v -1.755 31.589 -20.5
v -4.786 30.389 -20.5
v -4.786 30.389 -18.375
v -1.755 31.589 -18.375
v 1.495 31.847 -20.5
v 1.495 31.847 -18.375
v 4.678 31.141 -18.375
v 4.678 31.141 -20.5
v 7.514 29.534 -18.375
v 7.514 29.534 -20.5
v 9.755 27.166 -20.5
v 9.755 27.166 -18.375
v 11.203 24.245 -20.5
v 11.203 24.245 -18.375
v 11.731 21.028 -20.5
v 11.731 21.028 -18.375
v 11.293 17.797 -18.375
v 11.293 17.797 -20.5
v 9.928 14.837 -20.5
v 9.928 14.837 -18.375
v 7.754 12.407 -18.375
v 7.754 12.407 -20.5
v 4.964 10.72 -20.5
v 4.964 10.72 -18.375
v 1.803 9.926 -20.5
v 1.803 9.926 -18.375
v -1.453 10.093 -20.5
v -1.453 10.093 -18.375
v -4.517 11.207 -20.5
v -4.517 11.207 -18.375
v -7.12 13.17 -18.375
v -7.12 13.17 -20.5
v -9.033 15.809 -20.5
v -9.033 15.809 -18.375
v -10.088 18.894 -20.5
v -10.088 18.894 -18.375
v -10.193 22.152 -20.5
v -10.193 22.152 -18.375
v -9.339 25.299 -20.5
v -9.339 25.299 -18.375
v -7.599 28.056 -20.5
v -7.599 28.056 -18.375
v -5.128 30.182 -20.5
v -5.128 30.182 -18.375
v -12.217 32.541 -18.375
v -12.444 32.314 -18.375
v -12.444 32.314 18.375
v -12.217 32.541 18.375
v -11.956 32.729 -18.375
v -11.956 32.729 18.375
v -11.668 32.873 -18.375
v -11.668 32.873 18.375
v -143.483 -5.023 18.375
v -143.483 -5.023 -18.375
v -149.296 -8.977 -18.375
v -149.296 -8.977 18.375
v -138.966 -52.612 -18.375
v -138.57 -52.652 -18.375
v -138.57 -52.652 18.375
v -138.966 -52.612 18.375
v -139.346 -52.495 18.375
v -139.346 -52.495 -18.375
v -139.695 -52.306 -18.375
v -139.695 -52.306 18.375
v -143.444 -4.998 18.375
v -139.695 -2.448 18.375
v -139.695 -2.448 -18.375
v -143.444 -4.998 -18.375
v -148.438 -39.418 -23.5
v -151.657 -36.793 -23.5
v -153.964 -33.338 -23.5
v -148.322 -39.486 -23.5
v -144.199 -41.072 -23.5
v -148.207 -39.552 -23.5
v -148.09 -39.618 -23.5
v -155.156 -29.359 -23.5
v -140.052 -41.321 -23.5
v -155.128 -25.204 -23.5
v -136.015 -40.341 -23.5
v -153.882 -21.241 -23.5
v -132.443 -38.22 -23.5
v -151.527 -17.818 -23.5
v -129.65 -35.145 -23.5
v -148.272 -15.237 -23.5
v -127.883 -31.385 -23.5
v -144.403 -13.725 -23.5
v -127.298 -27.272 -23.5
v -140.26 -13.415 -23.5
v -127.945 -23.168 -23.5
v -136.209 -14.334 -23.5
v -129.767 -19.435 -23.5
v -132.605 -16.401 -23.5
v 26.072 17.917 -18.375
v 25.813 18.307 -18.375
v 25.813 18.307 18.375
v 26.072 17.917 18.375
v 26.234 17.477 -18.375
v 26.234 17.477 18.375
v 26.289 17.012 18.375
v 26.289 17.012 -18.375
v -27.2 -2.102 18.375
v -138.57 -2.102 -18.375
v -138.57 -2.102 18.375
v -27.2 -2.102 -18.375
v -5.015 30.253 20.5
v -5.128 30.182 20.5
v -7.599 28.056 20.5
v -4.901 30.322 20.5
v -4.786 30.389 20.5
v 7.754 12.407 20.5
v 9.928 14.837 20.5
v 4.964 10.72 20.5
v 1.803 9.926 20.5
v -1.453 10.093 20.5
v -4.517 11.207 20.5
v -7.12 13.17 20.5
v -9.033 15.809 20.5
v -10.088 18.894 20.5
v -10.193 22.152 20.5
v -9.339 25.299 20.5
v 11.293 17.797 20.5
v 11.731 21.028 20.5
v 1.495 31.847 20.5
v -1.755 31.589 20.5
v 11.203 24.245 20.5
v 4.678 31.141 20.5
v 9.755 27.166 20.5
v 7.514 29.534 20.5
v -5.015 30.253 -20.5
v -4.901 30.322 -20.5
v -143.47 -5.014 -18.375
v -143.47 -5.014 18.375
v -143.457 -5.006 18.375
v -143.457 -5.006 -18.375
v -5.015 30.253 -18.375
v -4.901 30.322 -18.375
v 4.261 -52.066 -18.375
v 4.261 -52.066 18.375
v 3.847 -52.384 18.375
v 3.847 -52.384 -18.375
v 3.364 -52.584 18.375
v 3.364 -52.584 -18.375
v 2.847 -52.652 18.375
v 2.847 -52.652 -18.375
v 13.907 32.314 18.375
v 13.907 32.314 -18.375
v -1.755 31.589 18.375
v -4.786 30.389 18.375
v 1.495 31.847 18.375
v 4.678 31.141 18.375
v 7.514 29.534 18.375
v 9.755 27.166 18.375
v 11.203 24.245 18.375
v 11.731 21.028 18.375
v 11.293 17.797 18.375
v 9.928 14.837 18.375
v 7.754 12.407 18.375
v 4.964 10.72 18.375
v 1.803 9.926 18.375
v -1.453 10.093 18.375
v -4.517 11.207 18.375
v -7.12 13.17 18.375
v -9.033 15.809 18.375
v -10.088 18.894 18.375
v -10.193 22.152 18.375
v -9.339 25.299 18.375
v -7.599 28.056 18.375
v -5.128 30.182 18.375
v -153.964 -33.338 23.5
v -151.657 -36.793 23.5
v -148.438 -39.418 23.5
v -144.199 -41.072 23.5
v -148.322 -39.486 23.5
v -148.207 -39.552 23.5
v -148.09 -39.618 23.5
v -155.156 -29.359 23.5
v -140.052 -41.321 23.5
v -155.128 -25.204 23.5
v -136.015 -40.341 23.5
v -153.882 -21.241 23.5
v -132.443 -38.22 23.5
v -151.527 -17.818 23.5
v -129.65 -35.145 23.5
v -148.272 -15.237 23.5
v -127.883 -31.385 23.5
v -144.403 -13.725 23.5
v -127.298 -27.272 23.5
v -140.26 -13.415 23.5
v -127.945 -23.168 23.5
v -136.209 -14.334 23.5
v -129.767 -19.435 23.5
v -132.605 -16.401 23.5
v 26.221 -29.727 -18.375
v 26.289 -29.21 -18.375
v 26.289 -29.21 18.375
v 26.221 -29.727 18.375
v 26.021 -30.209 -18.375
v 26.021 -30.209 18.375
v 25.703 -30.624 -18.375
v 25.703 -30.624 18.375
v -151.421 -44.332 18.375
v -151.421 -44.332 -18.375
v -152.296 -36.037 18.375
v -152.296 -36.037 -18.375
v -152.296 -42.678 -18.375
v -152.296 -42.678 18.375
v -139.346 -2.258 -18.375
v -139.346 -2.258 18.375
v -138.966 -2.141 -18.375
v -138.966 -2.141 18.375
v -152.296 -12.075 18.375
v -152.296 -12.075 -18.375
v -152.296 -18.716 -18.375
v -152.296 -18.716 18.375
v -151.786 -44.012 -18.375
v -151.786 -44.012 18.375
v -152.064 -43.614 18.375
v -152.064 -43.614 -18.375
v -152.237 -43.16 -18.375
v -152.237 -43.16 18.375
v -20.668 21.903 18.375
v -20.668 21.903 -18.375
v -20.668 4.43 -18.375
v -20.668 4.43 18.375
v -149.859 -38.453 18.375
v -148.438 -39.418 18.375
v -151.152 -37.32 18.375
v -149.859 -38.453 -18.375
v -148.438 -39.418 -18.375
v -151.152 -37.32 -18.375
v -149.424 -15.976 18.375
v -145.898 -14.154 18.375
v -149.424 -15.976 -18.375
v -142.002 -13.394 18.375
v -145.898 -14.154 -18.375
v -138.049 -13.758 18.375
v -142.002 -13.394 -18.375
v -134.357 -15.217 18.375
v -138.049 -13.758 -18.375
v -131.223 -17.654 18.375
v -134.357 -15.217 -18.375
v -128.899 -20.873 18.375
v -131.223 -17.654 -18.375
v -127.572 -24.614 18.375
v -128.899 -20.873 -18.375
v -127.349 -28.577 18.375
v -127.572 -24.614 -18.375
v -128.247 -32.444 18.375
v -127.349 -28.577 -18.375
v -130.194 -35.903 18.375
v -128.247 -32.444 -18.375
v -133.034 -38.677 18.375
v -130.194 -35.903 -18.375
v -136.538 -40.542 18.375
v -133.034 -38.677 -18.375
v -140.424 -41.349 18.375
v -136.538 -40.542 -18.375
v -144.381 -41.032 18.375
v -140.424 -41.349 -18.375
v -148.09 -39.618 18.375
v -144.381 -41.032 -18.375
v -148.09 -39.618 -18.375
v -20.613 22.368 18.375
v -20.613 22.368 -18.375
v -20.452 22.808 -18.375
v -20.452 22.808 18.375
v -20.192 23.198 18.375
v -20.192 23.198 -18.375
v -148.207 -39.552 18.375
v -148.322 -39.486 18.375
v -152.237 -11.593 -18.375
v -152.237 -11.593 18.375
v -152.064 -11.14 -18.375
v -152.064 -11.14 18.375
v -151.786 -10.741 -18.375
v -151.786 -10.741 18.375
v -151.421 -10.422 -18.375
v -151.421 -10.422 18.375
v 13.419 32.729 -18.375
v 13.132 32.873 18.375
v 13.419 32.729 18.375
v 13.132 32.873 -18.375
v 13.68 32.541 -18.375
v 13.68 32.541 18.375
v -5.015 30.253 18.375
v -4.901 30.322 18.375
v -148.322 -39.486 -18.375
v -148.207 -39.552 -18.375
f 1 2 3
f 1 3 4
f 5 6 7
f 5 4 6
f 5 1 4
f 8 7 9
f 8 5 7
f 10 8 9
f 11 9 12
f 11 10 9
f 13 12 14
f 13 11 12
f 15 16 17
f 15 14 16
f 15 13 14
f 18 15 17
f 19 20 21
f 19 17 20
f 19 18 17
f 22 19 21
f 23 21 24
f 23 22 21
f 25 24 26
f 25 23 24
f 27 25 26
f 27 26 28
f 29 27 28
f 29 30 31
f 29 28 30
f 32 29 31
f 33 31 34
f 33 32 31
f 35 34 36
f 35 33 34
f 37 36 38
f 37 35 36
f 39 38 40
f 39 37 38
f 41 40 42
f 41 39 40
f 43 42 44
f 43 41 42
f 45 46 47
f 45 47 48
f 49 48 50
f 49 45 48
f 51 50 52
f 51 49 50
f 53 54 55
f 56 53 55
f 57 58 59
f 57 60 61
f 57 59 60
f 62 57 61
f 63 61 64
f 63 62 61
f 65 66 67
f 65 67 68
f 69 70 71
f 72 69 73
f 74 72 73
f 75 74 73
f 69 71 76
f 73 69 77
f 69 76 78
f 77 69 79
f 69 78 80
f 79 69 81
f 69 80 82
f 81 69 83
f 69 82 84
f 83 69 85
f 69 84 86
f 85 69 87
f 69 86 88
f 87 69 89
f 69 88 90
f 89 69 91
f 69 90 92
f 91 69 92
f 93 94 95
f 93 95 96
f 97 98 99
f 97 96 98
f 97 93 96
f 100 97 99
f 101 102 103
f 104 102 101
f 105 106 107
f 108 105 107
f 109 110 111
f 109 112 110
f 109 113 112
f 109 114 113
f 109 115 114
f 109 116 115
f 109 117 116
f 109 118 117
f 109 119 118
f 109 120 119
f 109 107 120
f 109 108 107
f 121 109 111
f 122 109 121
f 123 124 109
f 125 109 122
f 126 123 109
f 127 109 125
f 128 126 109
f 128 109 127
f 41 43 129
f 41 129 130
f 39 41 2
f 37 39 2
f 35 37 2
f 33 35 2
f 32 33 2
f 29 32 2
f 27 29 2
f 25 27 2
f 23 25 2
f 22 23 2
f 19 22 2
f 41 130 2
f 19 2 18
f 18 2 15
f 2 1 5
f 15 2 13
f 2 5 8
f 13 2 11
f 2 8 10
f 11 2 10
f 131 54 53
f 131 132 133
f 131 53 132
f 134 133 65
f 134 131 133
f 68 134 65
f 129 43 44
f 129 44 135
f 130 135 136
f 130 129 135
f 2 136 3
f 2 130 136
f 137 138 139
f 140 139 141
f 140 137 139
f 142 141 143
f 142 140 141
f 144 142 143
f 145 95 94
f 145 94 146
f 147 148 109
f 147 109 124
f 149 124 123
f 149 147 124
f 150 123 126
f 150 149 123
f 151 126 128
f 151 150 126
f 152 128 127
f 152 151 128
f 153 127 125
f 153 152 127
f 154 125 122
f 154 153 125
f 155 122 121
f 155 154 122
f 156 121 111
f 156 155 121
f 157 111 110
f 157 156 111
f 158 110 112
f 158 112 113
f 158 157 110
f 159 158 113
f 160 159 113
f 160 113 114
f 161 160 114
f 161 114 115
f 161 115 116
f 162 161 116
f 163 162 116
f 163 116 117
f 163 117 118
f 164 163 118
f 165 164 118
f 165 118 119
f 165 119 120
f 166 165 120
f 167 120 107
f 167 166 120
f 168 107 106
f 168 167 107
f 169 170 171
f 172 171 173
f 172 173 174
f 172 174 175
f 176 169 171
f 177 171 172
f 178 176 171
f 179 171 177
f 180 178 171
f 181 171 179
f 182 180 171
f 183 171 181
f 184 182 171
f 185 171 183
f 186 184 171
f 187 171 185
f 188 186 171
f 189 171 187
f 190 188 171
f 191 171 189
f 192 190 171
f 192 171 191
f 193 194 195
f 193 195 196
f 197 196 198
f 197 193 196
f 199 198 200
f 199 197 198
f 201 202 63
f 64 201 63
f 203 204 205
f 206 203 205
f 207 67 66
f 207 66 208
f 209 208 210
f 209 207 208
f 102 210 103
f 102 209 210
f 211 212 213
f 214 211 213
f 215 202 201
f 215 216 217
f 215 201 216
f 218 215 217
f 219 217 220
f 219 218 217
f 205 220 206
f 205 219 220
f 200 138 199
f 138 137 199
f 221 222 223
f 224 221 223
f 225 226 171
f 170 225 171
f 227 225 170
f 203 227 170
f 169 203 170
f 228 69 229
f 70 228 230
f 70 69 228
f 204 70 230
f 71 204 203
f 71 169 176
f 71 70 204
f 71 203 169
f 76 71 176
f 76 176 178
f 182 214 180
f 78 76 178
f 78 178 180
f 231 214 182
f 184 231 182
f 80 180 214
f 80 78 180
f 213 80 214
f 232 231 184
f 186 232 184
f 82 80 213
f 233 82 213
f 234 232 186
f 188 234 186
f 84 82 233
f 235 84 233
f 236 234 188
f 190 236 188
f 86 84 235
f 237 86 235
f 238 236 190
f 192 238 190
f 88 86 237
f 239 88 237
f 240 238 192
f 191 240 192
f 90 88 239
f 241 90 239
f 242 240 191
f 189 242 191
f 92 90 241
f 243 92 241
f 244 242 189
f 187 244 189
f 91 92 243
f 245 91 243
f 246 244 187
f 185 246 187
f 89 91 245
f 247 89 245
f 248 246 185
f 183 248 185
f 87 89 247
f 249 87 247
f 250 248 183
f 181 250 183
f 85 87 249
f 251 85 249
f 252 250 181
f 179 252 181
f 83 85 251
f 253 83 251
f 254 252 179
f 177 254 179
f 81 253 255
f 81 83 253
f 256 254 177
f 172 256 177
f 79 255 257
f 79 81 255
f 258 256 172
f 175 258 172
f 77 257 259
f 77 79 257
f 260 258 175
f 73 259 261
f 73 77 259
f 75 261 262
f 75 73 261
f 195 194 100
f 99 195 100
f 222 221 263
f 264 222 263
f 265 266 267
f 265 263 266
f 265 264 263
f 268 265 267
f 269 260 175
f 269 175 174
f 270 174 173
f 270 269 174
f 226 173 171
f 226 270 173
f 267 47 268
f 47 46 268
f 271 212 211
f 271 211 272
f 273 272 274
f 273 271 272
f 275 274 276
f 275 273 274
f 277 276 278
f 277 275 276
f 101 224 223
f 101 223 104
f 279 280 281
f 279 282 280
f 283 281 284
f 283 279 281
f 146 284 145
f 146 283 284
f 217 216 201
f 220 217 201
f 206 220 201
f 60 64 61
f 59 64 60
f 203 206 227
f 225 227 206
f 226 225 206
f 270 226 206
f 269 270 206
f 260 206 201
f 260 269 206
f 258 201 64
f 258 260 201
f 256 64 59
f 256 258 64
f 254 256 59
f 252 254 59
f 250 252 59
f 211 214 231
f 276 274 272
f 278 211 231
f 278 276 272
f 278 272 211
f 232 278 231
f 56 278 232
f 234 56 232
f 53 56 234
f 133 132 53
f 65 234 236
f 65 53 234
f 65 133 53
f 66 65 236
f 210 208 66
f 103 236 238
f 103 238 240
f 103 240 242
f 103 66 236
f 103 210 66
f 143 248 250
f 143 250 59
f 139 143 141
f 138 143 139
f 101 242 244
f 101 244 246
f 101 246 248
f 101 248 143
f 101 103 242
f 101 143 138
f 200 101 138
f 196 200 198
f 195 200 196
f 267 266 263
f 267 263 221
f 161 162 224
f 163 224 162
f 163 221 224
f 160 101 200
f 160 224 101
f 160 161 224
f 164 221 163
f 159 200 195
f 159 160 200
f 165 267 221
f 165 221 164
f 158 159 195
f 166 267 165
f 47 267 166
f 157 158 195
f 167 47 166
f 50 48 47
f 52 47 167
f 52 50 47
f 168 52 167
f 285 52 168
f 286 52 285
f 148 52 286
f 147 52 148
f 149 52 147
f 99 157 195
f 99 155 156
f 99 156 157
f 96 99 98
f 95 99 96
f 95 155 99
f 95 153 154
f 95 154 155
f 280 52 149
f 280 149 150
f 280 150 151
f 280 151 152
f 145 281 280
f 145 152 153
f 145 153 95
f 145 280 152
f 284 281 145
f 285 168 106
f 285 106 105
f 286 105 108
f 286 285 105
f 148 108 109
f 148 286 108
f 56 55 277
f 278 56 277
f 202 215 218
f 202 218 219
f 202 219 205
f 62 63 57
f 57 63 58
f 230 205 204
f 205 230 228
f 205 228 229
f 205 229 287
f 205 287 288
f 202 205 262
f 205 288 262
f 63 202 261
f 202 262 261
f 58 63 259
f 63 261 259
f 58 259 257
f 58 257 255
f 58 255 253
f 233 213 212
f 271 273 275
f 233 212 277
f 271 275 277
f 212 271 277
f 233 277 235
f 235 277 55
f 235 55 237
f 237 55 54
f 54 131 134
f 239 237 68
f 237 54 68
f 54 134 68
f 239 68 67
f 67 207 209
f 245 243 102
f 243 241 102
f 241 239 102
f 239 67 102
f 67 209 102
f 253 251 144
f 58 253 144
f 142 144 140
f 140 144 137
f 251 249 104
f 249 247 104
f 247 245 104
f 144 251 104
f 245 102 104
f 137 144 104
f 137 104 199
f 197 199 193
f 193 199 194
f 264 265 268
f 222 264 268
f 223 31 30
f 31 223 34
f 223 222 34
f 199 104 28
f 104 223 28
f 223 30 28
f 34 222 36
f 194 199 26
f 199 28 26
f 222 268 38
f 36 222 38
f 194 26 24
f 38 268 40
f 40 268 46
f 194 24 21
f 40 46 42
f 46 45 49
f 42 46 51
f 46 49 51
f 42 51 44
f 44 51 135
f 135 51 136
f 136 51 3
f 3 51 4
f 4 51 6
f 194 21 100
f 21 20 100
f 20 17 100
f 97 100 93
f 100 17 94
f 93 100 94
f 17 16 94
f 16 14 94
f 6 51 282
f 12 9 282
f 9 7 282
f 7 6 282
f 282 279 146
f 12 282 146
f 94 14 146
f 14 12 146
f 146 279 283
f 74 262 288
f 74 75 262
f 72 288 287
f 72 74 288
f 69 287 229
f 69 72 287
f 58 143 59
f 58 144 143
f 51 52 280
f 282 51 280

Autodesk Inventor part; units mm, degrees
ref_plane "YZ Plane" through (0, 0, 0) normal (1, 0, 0) x (0, 1, 0)
ref_plane "XZ Plane" through (0, 0, 0) normal (0, 1, 0) x (-1, 0, 0)
ref_plane "XY Plane" through (0, 0, 0) normal (0, 0, 1) x (1, 0, 0)
sketch "Sketch1" plane through (0, 0, 0) normal (0, 0, 1) x (1, 0, 0)
  arc A0 (2.8466, -52.6517) -> (4.2608, -52.0659) centre (2.8466, -50.6517) ccw
  line L0 (4.2608, -52.0659) -> (25.703, -30.6237)
  arc A1 (25.703, -30.6237) -> (26.2888, -29.2095) centre (24.2888, -29.2095) ccw
  line L1 (26.2888, -29.2095) -> (26.2888, 17.012)
  arc A2 (26.2888, 17.012) -> (25.8127, 18.3073) centre (24.2888, 17.012) ccw
  line L2 (25.8127, 18.3073) -> (13.9072, 32.3139)
  arc A3 (13.9072, 32.3139) -> (13.1317, 32.8733) centre (12.3833, 31.0186) ccw
  arc A4 (-11.6683, 32.8733) -> (-12.4438, 32.3139) centre (-10.9199, 31.0186) ccw
  line L3 (-12.4438, 32.3139) -> (-20.1922, 23.1981)
  arc A5 (-20.1922, 23.1981) -> (-20.6683, 21.9028) centre (-18.6683, 21.9028) ccw
  line L4 (-20.6683, 21.9028) -> (-20.6683, 4.4299)
  line L5 (-20.6683, 4.4299) -> (-27.2, -2.1017)
  arc A6 (-139.695, -52.3056) -> (-138.5704, -52.6517) centre (-138.5704, -50.6517) ccw
  arc A7 (-138.5704, -2.1017) -> (-139.695, -2.4479) centre (-138.5704, -4.1017) ccw
  line L6 (-139.695, -2.4479) -> (-143.4444, -4.9975)
  arc A8 (-143.4444, -4.9975) -> (-143.4828, -5.023) centre (-142.3581, -6.6767) ccw
  line L7 (-143.4828, -5.023) -> (-149.2963, -8.9767)
  line L8 (-149.2963, -8.9767) -> (-151.4209, -10.4215)
  arc A9 (-151.4209, -10.4215) -> (-152.2963, -12.0753) centre (-150.2963, -12.0753) ccw
  line L9 (-152.2963, -12.0753) -> (-152.2963, -12.6767)
  line L10 (-152.2963, -42.0767) -> (-152.2963, -42.6781)
  arc A10 (-152.2963, -42.6781) -> (-151.4209, -44.332) centre (-150.2963, -42.6781) ccw
  line L11 (-151.4209, -44.332) -> (-139.695, -52.3056)
  arc A11 (-5.1284, 30.1824) -> (-4.7861, 30.3893) centre (0.7317, 20.8733) ccw
  arc A12 (-148.0905, -39.6176) -> (-148.4375, -39.4185) centre (-141.2963, -27.3767) ccw
  line L12 (-11.6683, 32.8733) -> (13.1317, 32.8733)
  line L13 (-152.2963, -12.6767) -> (-152.2963, -18.7165)
  line L14 (-152.2963, -36.037) -> (-152.2963, -42.0767)
  line L15 (2.8466, -52.6517) -> (-138.5704, -52.6517)
  line L16 (-138.5704, -2.1017) -> (-27.2, -2.1017)
  circle A13 centre (0.7317, 20.8733) radius 11
  circle A14 centre (-141.2963, -27.3767) radius 14
extrude "Extrusion1" add sketch "Sketch1" along normal mid plane 36.75 contours L15 A6 L11 A10 L10 L14 A12 A14 L13 L9 A9 L8 L7 A8 L6 A7 L16 L5 L4 A5 L3 A4 L12 A3 L2 A2 L1 A1 L0 A0
extrude "Extrusion2" add sketch "Sketch1" along normal mid plane 47 contours A12 A14
extrude "Extrusion3" add sketch "Sketch1" along normal mid plane 41 contours A13 A11
properties part number "Bicep"
